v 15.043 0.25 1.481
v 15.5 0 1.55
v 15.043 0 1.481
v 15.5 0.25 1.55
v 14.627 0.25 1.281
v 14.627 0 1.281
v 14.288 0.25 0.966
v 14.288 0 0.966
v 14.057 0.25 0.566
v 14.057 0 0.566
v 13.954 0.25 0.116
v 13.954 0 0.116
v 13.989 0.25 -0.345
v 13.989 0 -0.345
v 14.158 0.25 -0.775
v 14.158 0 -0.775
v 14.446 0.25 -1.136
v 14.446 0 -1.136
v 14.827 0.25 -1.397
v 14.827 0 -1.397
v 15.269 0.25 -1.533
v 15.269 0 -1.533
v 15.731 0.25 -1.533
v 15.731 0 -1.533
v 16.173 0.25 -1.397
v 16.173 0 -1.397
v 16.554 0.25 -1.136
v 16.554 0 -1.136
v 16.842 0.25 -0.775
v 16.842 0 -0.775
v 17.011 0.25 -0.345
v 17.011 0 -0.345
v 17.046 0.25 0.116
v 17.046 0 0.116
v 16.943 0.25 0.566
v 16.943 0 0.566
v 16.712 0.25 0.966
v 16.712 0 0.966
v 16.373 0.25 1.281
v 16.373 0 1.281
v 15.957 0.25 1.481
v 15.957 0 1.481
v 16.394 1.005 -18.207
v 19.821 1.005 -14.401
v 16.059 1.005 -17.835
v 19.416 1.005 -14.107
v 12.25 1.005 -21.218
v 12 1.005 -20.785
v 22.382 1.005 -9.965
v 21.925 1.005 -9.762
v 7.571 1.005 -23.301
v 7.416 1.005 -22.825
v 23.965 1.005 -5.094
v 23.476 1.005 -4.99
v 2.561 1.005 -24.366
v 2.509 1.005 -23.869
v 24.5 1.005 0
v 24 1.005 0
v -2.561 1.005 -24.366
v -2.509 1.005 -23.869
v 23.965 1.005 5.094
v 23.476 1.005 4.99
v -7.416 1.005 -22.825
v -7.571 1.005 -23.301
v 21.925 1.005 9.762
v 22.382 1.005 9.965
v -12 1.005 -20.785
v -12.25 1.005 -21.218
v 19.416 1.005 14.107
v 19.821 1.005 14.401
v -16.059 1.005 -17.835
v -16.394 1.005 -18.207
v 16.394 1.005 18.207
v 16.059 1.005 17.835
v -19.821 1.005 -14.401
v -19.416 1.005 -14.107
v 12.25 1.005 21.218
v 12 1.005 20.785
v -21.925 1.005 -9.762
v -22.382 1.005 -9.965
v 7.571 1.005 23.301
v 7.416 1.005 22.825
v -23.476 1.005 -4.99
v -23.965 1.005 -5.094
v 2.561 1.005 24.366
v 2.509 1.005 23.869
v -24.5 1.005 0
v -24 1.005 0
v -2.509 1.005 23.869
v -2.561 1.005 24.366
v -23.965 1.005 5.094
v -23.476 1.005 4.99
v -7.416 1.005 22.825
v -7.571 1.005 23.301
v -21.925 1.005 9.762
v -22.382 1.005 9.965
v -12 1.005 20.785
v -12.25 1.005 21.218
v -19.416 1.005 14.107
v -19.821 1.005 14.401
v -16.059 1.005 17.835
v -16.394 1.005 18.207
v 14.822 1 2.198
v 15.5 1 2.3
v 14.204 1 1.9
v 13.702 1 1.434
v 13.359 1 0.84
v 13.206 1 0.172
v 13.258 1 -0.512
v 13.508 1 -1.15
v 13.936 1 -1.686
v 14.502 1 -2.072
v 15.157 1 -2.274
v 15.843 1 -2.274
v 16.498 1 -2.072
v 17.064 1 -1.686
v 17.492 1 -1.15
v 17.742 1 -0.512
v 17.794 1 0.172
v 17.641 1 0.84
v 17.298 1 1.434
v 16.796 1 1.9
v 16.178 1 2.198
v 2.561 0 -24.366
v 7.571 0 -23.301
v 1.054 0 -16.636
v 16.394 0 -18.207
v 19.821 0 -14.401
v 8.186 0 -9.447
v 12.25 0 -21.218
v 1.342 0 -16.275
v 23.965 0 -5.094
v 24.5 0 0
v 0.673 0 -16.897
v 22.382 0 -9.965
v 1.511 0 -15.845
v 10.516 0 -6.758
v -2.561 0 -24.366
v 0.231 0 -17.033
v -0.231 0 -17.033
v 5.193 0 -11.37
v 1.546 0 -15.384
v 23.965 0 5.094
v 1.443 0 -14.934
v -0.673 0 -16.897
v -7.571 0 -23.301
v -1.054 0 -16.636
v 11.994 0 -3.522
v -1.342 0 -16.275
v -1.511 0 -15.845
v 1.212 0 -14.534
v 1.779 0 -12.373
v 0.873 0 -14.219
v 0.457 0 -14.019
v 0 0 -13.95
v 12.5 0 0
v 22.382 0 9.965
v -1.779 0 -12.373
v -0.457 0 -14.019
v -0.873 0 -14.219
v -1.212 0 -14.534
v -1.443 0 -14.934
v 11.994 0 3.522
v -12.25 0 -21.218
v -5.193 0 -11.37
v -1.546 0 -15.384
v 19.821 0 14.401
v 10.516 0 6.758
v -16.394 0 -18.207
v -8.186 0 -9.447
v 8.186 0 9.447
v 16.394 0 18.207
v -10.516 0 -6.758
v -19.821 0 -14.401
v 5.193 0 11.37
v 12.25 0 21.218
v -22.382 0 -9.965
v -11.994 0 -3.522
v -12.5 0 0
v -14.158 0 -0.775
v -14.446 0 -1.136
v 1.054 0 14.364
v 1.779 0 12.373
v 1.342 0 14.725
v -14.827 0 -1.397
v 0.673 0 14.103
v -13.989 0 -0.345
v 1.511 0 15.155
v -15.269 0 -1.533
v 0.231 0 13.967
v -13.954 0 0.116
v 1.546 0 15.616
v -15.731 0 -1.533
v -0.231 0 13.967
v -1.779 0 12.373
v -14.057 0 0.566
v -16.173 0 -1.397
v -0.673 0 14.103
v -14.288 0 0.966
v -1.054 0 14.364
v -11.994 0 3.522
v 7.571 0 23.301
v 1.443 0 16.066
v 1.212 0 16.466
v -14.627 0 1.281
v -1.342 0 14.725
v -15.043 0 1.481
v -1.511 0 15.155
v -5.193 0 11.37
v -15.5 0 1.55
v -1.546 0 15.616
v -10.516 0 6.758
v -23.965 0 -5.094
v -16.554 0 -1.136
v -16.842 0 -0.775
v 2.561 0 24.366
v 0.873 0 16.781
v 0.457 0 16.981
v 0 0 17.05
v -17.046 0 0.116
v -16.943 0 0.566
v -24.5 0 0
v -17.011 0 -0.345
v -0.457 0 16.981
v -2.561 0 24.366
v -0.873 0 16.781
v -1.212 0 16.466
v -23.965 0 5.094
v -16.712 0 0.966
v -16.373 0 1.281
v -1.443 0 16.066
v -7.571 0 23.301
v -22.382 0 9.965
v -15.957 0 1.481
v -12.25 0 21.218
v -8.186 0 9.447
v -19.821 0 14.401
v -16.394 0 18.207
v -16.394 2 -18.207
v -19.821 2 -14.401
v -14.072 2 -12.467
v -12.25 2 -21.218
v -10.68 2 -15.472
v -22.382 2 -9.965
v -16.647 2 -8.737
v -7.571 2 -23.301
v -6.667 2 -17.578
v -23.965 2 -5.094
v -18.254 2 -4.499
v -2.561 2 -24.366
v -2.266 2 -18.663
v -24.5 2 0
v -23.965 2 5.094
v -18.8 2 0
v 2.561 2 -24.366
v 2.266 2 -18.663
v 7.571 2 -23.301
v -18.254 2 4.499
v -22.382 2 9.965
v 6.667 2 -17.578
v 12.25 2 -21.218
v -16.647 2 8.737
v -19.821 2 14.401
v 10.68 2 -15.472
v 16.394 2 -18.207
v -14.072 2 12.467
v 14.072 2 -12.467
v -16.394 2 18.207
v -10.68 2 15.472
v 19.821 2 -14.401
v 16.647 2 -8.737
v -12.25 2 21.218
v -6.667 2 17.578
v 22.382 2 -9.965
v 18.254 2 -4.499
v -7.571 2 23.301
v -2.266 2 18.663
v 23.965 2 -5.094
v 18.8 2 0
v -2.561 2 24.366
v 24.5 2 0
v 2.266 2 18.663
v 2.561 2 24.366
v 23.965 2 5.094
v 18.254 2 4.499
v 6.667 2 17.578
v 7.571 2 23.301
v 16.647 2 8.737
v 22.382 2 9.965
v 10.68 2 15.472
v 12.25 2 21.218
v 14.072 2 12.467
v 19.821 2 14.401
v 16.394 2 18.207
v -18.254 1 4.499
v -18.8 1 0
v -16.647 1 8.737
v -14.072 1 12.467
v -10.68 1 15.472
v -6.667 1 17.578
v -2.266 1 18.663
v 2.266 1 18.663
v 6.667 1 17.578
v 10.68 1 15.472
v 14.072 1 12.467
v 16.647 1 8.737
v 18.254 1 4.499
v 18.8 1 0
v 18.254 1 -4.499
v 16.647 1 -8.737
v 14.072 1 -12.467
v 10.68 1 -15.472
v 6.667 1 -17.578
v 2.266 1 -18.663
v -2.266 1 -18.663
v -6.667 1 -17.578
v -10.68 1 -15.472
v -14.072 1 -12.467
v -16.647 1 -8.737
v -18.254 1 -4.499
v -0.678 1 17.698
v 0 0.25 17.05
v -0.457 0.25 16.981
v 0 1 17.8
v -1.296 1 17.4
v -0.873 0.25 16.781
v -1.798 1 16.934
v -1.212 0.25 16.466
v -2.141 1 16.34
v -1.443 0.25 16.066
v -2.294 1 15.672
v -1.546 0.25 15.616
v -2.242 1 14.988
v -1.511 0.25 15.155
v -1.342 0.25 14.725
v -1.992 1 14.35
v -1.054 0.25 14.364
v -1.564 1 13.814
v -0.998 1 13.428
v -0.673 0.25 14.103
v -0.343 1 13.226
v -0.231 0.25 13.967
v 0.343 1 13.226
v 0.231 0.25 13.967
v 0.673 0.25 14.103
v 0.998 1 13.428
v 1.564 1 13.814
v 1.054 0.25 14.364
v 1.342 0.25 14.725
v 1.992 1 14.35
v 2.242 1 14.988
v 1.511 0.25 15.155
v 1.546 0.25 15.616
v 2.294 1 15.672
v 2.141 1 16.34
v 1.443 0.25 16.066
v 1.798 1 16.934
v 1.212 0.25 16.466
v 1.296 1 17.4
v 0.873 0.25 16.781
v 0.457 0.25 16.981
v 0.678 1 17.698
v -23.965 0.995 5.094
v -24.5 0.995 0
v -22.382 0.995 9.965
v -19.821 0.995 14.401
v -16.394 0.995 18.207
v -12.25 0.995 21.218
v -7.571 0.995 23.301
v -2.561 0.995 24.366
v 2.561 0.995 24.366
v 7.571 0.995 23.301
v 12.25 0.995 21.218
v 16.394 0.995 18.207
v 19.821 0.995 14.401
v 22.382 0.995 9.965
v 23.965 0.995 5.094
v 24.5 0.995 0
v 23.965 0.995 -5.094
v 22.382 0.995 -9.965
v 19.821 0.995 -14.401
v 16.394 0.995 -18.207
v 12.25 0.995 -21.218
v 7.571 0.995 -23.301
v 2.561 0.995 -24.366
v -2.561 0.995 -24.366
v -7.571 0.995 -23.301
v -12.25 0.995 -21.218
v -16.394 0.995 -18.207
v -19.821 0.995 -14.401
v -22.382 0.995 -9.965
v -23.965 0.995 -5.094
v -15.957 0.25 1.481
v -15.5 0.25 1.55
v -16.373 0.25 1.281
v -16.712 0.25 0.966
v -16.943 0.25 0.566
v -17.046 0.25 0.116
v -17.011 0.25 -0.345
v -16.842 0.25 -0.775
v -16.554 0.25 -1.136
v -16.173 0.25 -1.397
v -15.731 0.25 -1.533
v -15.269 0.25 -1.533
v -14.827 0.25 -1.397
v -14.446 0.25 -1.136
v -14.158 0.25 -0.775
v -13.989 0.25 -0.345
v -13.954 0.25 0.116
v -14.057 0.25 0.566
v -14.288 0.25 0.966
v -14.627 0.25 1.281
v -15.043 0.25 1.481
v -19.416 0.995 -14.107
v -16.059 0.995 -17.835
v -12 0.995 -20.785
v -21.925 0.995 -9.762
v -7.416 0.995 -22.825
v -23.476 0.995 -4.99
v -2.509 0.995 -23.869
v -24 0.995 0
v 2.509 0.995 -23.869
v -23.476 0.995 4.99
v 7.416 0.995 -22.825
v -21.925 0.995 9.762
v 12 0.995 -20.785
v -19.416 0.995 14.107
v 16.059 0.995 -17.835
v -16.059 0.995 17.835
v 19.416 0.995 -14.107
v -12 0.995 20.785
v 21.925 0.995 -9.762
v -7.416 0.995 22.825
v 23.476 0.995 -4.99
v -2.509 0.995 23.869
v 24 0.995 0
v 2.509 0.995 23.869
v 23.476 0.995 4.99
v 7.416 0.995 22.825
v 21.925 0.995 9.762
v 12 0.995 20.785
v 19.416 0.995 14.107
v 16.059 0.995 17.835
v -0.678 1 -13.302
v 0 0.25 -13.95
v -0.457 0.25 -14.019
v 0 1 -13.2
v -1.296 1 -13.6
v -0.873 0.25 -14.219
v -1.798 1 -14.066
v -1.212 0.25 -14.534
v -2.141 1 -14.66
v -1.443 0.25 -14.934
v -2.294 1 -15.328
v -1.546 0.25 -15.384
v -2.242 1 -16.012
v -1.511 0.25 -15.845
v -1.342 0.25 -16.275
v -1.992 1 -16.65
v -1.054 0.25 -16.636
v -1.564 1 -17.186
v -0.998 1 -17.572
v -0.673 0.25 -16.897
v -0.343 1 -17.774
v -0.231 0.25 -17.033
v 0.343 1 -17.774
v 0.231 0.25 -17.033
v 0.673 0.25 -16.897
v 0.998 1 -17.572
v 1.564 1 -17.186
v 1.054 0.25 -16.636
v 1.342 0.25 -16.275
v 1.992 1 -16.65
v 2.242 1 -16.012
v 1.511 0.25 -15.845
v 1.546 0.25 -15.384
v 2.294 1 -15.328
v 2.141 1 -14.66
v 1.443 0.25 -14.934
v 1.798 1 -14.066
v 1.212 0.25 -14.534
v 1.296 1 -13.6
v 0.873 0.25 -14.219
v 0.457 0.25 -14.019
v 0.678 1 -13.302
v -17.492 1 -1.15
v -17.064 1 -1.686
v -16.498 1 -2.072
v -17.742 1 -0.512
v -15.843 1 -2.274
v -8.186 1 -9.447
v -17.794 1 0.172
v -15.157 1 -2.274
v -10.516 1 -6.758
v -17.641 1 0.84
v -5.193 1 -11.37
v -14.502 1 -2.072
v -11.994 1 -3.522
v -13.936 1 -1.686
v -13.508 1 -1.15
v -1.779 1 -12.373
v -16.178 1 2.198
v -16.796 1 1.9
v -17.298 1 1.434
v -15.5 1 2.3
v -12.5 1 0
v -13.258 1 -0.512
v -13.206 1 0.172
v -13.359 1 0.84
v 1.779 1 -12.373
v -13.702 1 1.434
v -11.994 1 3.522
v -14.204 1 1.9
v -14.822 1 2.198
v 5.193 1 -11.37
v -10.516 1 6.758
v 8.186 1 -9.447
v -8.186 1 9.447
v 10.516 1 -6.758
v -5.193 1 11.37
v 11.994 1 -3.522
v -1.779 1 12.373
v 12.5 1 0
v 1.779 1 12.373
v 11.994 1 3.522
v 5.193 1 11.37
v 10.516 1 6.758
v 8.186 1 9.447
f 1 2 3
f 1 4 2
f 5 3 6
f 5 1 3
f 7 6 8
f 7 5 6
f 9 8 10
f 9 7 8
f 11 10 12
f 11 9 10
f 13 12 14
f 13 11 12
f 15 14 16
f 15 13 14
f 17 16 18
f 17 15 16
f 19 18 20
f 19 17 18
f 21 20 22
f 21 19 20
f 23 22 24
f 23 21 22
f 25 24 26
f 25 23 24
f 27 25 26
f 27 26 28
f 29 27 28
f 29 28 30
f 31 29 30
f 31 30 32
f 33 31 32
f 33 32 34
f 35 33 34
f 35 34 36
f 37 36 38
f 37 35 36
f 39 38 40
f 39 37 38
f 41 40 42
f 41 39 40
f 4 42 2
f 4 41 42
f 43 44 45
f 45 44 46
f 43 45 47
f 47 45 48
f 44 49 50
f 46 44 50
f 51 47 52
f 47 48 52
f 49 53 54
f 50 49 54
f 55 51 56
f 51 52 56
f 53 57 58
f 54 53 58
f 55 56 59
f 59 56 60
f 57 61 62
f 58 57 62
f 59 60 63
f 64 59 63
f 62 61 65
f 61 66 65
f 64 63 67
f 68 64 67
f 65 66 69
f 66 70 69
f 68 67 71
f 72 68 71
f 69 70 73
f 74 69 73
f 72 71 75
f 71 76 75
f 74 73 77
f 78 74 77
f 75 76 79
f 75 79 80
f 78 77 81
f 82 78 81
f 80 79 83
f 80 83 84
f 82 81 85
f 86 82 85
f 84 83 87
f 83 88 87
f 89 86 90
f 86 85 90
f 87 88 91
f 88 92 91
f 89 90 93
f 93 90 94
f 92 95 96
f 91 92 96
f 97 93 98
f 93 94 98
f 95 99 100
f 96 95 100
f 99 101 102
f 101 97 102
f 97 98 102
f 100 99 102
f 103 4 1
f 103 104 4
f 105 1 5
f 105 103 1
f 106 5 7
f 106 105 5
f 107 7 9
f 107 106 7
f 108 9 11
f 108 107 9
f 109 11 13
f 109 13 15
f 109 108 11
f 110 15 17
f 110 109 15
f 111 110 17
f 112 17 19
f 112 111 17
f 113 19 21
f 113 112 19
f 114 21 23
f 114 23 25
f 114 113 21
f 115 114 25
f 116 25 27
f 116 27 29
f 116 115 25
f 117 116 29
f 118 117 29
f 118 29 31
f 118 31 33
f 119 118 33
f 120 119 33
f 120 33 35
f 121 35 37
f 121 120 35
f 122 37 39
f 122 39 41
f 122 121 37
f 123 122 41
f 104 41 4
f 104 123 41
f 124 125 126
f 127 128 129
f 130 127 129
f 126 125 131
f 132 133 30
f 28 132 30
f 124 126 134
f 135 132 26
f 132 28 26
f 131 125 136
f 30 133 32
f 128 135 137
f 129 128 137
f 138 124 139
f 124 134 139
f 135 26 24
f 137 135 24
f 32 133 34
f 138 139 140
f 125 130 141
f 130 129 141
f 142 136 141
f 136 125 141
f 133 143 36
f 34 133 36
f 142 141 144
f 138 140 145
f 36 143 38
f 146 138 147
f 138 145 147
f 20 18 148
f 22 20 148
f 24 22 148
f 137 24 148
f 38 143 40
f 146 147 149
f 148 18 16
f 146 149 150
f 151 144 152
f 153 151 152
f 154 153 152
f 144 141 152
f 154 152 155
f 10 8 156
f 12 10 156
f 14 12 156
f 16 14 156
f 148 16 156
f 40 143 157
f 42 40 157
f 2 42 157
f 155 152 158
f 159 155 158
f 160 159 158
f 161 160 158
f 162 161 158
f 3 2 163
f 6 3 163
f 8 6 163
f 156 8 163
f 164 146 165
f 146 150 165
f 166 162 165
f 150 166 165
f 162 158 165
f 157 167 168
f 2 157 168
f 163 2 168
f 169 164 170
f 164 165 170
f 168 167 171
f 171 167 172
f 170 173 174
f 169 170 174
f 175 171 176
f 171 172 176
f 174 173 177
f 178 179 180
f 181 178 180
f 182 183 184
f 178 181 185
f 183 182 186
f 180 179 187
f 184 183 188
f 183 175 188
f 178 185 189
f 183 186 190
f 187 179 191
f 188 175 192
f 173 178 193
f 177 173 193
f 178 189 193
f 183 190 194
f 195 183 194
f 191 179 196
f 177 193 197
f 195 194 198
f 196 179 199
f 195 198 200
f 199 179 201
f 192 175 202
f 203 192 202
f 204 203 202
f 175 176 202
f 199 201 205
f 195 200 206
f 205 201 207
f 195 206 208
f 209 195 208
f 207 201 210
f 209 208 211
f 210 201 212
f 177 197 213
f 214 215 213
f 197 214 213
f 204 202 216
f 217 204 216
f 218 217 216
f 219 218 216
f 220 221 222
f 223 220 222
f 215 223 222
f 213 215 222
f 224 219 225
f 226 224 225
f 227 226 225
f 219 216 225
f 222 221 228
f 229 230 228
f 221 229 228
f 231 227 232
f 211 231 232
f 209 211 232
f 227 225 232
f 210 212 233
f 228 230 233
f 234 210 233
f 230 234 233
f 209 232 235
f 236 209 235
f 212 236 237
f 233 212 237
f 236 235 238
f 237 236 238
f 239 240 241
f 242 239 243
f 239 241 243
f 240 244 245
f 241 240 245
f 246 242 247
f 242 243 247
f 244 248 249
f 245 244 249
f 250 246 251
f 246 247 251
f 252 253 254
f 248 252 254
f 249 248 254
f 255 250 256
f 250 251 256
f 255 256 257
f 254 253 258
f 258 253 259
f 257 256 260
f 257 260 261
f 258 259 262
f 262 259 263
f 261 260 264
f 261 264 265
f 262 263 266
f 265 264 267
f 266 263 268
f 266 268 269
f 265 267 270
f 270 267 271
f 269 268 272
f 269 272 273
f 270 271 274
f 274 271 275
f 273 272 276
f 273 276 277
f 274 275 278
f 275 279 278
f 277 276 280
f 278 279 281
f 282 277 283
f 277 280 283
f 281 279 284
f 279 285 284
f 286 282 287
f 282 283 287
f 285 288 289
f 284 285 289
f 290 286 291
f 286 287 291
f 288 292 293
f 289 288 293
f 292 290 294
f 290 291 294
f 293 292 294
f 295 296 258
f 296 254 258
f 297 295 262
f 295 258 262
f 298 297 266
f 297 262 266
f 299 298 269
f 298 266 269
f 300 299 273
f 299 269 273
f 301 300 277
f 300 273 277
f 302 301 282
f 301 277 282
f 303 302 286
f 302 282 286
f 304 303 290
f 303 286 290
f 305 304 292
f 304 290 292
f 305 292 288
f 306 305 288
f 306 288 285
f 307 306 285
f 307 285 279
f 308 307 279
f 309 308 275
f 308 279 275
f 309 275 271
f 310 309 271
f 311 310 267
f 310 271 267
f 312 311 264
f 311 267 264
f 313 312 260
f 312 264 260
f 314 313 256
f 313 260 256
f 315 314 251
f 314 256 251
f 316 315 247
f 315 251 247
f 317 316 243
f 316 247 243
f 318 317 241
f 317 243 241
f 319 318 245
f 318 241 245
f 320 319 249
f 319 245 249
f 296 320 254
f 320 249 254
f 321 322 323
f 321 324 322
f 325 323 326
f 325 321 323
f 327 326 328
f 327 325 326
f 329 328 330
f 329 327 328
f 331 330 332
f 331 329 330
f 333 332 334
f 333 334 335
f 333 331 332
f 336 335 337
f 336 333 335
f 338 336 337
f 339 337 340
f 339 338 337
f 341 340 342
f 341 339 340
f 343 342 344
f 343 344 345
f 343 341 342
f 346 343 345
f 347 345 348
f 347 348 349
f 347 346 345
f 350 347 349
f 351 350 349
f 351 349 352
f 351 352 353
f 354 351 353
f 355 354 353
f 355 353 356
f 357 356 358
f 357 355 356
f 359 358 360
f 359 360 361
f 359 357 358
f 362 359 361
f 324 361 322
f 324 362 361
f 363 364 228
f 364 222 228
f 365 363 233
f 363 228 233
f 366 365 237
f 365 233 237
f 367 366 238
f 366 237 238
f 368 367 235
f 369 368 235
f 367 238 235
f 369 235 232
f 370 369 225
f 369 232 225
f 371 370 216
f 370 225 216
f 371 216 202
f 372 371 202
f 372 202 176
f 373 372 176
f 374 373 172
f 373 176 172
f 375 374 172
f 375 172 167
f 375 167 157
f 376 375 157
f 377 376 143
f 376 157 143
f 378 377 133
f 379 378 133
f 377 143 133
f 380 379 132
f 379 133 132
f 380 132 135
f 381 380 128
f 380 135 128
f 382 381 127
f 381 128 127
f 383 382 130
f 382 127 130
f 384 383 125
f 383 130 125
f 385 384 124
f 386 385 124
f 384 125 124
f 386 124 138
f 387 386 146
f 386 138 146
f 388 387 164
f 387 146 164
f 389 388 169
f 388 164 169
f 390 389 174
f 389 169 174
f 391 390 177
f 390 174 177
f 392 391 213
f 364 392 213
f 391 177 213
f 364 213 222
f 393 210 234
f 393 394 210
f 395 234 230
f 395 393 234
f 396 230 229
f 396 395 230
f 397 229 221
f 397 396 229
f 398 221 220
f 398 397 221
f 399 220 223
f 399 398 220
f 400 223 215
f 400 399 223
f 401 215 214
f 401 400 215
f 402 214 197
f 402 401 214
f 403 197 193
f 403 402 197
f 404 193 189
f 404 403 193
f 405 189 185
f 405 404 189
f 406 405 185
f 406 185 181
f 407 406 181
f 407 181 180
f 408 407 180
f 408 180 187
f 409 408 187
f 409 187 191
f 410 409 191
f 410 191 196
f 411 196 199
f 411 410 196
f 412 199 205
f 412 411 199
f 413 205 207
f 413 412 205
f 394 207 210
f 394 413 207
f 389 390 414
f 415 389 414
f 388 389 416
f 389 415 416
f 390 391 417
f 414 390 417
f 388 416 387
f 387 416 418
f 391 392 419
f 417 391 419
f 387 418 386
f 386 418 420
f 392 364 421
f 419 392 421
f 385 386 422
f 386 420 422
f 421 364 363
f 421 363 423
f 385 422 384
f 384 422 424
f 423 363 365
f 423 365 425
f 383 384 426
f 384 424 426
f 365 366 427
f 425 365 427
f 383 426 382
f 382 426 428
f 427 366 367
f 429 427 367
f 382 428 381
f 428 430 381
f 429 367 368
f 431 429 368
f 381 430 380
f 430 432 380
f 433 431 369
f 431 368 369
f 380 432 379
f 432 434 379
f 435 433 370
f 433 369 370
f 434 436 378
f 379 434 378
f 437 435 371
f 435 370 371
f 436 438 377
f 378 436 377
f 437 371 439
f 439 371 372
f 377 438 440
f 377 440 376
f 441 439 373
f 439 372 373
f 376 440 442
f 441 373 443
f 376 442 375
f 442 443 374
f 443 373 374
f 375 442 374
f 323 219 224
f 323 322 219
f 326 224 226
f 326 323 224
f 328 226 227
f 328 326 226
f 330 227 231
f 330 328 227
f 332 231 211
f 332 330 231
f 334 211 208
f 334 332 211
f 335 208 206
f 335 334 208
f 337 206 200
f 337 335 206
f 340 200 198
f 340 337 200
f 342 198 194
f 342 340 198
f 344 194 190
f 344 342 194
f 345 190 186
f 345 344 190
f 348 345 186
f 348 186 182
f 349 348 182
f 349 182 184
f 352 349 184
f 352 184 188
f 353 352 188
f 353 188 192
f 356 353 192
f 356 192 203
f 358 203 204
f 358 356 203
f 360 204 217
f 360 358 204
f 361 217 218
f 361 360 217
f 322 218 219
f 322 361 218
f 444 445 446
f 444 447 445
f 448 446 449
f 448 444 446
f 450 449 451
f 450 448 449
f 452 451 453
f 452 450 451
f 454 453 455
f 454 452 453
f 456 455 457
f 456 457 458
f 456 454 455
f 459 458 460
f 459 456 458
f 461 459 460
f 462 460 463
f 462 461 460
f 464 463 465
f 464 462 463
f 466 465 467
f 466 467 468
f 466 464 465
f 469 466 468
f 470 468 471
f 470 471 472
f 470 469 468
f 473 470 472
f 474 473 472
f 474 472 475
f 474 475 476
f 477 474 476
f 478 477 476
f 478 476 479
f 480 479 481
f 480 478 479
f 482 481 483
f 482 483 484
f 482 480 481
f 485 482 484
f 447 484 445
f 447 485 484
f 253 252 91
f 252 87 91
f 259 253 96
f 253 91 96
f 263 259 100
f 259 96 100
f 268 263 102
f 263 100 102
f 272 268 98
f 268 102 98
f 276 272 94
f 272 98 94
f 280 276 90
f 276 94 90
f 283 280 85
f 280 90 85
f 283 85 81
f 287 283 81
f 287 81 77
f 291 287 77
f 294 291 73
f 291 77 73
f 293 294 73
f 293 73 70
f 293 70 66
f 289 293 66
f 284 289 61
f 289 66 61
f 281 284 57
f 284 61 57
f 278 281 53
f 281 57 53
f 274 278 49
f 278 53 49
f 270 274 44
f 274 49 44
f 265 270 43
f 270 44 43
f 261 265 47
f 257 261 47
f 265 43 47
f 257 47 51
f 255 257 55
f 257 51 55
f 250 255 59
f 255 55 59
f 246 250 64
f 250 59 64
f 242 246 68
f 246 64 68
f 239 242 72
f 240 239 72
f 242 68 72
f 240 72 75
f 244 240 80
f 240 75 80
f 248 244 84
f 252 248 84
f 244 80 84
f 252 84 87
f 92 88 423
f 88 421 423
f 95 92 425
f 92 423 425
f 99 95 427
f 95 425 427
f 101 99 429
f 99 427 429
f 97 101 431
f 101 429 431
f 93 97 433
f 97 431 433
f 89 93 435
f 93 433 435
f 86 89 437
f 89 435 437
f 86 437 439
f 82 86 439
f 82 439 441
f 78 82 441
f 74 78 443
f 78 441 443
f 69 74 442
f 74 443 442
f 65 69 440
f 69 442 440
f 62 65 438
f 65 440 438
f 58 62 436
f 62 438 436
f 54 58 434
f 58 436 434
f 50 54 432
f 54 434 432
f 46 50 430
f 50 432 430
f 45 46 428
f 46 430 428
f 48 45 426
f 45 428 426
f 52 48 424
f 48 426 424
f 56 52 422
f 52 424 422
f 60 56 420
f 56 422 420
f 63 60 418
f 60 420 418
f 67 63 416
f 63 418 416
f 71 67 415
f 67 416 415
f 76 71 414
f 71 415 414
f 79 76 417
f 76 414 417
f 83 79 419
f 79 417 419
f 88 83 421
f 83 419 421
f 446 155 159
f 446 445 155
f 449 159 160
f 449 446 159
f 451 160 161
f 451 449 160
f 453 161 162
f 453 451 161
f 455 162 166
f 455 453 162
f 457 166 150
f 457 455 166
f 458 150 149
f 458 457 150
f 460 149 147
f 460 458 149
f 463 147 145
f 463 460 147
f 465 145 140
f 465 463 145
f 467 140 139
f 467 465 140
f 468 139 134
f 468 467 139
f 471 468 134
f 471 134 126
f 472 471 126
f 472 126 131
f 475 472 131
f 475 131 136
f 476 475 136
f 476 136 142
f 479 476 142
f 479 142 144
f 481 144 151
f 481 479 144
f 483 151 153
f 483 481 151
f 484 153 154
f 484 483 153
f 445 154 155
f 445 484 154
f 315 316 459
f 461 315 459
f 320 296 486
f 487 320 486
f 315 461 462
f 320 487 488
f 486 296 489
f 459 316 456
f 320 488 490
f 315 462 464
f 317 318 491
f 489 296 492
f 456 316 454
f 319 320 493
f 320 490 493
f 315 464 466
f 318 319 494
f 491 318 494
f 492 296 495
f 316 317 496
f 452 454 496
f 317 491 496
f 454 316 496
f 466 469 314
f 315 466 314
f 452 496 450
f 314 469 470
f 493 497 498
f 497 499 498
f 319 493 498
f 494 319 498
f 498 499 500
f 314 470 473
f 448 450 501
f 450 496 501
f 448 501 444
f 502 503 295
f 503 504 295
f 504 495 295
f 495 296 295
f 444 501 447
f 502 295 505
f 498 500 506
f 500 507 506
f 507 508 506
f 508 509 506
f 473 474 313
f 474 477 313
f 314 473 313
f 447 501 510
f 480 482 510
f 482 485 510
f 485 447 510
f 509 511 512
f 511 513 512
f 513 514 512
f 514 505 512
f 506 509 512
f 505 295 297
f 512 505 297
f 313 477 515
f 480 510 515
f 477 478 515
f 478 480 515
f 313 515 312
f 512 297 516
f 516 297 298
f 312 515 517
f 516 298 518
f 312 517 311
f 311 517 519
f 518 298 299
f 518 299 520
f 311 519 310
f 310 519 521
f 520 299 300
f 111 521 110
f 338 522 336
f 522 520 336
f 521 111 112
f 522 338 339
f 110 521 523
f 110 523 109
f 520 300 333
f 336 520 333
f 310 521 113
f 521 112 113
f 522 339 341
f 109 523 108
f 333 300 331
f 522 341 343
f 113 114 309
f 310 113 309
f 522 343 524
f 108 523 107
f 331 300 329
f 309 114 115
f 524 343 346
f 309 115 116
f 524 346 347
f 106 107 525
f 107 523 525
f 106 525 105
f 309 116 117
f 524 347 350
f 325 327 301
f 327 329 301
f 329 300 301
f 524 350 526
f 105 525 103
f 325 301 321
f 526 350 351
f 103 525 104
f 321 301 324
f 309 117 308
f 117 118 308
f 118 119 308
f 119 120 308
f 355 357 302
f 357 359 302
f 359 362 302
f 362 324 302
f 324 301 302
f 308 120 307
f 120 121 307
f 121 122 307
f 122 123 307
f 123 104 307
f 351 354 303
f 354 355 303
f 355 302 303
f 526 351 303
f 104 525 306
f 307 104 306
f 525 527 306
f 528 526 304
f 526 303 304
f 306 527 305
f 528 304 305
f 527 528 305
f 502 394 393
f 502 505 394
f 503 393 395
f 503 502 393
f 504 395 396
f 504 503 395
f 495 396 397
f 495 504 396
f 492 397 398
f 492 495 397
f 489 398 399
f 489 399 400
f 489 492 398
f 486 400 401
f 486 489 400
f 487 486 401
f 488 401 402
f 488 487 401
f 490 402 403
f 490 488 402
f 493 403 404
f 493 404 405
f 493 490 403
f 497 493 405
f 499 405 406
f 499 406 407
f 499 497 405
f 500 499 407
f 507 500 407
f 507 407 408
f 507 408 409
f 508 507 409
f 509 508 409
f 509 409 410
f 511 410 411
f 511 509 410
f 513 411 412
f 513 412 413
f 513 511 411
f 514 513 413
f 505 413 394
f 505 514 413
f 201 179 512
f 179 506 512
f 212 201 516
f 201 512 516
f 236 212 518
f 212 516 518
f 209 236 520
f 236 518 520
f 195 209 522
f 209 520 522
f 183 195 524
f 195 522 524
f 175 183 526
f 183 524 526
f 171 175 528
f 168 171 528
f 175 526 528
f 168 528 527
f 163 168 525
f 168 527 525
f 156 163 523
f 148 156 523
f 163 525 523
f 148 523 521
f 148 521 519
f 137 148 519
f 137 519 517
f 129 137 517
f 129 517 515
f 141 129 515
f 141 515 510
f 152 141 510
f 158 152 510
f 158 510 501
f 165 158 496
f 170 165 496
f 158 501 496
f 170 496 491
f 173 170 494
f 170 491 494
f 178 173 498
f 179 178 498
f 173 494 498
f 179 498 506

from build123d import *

# Parameters (mm, degrees)
CSK_FOR_M2_5_COUNTERSUNK_FLAT_HEAD_S_2_COUNT = 2
CSK_FOR_M2_5_COUNTERSUNK_FLAT_HEAD_S_2_PITCH = 21.920310217
CSK_FOR_M2_5_COUNTERSUNK_FLAT_HEAD_S_3_COUNT = 2
CSK_FOR_M2_5_COUNTERSUNK_FLAT_HEAD_S_3_PITCH = 31
CSK_FOR_M2_5_COUNTERSUNK_FLAT_HEAD_S_4_COUNT = 2
CSK_FOR_M2_5_COUNTERSUNK_FLAT_HEAD_S_4_PITCH = 21.920310217


with BuildPart() as part:
    # Sketch1 → Revolve1 (revolve)
    with BuildSketch(Plane.XY):
        Polygon((-24.5, 0), (-12.5, 0), (-12.5, 1), (-18.8, 1), (-18.8, 2), (-24.5, 2), (-24.5, 1.005), (-24, 1.005), (-24, 0.995), (-24.5, 0.995), align=None)
    revolve(axis=Axis((0, 0, 0), (0, 1, 0)))

    # Sketch2 → CSK for M2.5 Countersunk Flat Head Screw1 (revolve, cut)
    with BuildSketch(Plane(origin=(0, 1, -15.5), x_dir=(0, 0, 1), z_dir=(1, 0, 0))):
        Polygon((0, 0), (0, 1), (1.55, 1), (1.55, 0.75), (2.3, 0), align=None)
    csk_for_m2_5_countersunk_flat_head_screw = revolve(axis=Axis((0, 7.35, -15.5), (0, -1, 0)), mode=Mode.SUBTRACT)

    # CSK for M2.5 Countersunk Flat Head S 2: CSK for M2.5 Countersunk Flat Head Screw1 ×2
    with Locations(*[Vector(-0.707106781, 0, 0.707106781) * (i * CSK_FOR_M2_5_COUNTERSUNK_FLAT_HEAD_S_2_PITCH) for i in range(1, CSK_FOR_M2_5_COUNTERSUNK_FLAT_HEAD_S_2_COUNT)]):
        add(csk_for_m2_5_countersunk_flat_head_screw, mode=Mode.SUBTRACT)

    # CSK for M2.5 Countersunk Flat Head S 3: CSK for M2.5 Countersunk Flat Head Screw1 ×2
    with Locations(*[(0, 0, i * CSK_FOR_M2_5_COUNTERSUNK_FLAT_HEAD_S_3_PITCH) for i in range(1, CSK_FOR_M2_5_COUNTERSUNK_FLAT_HEAD_S_3_COUNT)]):
        add(csk_for_m2_5_countersunk_flat_head_screw, mode=Mode.SUBTRACT)

    # CSK for M2.5 Countersunk Flat Head S 4: CSK for M2.5 Countersunk Flat Head Screw1 ×2
    with Locations(*[Vector(0.707106781, 0, 0.707106781) * (i * CSK_FOR_M2_5_COUNTERSUNK_FLAT_HEAD_S_4_PITCH) for i in range(1, CSK_FOR_M2_5_COUNTERSUNK_FLAT_HEAD_S_4_COUNT)]):
        add(csk_for_m2_5_countersunk_flat_head_screw, mode=Mode.SUBTRACT)


solid = part.part
